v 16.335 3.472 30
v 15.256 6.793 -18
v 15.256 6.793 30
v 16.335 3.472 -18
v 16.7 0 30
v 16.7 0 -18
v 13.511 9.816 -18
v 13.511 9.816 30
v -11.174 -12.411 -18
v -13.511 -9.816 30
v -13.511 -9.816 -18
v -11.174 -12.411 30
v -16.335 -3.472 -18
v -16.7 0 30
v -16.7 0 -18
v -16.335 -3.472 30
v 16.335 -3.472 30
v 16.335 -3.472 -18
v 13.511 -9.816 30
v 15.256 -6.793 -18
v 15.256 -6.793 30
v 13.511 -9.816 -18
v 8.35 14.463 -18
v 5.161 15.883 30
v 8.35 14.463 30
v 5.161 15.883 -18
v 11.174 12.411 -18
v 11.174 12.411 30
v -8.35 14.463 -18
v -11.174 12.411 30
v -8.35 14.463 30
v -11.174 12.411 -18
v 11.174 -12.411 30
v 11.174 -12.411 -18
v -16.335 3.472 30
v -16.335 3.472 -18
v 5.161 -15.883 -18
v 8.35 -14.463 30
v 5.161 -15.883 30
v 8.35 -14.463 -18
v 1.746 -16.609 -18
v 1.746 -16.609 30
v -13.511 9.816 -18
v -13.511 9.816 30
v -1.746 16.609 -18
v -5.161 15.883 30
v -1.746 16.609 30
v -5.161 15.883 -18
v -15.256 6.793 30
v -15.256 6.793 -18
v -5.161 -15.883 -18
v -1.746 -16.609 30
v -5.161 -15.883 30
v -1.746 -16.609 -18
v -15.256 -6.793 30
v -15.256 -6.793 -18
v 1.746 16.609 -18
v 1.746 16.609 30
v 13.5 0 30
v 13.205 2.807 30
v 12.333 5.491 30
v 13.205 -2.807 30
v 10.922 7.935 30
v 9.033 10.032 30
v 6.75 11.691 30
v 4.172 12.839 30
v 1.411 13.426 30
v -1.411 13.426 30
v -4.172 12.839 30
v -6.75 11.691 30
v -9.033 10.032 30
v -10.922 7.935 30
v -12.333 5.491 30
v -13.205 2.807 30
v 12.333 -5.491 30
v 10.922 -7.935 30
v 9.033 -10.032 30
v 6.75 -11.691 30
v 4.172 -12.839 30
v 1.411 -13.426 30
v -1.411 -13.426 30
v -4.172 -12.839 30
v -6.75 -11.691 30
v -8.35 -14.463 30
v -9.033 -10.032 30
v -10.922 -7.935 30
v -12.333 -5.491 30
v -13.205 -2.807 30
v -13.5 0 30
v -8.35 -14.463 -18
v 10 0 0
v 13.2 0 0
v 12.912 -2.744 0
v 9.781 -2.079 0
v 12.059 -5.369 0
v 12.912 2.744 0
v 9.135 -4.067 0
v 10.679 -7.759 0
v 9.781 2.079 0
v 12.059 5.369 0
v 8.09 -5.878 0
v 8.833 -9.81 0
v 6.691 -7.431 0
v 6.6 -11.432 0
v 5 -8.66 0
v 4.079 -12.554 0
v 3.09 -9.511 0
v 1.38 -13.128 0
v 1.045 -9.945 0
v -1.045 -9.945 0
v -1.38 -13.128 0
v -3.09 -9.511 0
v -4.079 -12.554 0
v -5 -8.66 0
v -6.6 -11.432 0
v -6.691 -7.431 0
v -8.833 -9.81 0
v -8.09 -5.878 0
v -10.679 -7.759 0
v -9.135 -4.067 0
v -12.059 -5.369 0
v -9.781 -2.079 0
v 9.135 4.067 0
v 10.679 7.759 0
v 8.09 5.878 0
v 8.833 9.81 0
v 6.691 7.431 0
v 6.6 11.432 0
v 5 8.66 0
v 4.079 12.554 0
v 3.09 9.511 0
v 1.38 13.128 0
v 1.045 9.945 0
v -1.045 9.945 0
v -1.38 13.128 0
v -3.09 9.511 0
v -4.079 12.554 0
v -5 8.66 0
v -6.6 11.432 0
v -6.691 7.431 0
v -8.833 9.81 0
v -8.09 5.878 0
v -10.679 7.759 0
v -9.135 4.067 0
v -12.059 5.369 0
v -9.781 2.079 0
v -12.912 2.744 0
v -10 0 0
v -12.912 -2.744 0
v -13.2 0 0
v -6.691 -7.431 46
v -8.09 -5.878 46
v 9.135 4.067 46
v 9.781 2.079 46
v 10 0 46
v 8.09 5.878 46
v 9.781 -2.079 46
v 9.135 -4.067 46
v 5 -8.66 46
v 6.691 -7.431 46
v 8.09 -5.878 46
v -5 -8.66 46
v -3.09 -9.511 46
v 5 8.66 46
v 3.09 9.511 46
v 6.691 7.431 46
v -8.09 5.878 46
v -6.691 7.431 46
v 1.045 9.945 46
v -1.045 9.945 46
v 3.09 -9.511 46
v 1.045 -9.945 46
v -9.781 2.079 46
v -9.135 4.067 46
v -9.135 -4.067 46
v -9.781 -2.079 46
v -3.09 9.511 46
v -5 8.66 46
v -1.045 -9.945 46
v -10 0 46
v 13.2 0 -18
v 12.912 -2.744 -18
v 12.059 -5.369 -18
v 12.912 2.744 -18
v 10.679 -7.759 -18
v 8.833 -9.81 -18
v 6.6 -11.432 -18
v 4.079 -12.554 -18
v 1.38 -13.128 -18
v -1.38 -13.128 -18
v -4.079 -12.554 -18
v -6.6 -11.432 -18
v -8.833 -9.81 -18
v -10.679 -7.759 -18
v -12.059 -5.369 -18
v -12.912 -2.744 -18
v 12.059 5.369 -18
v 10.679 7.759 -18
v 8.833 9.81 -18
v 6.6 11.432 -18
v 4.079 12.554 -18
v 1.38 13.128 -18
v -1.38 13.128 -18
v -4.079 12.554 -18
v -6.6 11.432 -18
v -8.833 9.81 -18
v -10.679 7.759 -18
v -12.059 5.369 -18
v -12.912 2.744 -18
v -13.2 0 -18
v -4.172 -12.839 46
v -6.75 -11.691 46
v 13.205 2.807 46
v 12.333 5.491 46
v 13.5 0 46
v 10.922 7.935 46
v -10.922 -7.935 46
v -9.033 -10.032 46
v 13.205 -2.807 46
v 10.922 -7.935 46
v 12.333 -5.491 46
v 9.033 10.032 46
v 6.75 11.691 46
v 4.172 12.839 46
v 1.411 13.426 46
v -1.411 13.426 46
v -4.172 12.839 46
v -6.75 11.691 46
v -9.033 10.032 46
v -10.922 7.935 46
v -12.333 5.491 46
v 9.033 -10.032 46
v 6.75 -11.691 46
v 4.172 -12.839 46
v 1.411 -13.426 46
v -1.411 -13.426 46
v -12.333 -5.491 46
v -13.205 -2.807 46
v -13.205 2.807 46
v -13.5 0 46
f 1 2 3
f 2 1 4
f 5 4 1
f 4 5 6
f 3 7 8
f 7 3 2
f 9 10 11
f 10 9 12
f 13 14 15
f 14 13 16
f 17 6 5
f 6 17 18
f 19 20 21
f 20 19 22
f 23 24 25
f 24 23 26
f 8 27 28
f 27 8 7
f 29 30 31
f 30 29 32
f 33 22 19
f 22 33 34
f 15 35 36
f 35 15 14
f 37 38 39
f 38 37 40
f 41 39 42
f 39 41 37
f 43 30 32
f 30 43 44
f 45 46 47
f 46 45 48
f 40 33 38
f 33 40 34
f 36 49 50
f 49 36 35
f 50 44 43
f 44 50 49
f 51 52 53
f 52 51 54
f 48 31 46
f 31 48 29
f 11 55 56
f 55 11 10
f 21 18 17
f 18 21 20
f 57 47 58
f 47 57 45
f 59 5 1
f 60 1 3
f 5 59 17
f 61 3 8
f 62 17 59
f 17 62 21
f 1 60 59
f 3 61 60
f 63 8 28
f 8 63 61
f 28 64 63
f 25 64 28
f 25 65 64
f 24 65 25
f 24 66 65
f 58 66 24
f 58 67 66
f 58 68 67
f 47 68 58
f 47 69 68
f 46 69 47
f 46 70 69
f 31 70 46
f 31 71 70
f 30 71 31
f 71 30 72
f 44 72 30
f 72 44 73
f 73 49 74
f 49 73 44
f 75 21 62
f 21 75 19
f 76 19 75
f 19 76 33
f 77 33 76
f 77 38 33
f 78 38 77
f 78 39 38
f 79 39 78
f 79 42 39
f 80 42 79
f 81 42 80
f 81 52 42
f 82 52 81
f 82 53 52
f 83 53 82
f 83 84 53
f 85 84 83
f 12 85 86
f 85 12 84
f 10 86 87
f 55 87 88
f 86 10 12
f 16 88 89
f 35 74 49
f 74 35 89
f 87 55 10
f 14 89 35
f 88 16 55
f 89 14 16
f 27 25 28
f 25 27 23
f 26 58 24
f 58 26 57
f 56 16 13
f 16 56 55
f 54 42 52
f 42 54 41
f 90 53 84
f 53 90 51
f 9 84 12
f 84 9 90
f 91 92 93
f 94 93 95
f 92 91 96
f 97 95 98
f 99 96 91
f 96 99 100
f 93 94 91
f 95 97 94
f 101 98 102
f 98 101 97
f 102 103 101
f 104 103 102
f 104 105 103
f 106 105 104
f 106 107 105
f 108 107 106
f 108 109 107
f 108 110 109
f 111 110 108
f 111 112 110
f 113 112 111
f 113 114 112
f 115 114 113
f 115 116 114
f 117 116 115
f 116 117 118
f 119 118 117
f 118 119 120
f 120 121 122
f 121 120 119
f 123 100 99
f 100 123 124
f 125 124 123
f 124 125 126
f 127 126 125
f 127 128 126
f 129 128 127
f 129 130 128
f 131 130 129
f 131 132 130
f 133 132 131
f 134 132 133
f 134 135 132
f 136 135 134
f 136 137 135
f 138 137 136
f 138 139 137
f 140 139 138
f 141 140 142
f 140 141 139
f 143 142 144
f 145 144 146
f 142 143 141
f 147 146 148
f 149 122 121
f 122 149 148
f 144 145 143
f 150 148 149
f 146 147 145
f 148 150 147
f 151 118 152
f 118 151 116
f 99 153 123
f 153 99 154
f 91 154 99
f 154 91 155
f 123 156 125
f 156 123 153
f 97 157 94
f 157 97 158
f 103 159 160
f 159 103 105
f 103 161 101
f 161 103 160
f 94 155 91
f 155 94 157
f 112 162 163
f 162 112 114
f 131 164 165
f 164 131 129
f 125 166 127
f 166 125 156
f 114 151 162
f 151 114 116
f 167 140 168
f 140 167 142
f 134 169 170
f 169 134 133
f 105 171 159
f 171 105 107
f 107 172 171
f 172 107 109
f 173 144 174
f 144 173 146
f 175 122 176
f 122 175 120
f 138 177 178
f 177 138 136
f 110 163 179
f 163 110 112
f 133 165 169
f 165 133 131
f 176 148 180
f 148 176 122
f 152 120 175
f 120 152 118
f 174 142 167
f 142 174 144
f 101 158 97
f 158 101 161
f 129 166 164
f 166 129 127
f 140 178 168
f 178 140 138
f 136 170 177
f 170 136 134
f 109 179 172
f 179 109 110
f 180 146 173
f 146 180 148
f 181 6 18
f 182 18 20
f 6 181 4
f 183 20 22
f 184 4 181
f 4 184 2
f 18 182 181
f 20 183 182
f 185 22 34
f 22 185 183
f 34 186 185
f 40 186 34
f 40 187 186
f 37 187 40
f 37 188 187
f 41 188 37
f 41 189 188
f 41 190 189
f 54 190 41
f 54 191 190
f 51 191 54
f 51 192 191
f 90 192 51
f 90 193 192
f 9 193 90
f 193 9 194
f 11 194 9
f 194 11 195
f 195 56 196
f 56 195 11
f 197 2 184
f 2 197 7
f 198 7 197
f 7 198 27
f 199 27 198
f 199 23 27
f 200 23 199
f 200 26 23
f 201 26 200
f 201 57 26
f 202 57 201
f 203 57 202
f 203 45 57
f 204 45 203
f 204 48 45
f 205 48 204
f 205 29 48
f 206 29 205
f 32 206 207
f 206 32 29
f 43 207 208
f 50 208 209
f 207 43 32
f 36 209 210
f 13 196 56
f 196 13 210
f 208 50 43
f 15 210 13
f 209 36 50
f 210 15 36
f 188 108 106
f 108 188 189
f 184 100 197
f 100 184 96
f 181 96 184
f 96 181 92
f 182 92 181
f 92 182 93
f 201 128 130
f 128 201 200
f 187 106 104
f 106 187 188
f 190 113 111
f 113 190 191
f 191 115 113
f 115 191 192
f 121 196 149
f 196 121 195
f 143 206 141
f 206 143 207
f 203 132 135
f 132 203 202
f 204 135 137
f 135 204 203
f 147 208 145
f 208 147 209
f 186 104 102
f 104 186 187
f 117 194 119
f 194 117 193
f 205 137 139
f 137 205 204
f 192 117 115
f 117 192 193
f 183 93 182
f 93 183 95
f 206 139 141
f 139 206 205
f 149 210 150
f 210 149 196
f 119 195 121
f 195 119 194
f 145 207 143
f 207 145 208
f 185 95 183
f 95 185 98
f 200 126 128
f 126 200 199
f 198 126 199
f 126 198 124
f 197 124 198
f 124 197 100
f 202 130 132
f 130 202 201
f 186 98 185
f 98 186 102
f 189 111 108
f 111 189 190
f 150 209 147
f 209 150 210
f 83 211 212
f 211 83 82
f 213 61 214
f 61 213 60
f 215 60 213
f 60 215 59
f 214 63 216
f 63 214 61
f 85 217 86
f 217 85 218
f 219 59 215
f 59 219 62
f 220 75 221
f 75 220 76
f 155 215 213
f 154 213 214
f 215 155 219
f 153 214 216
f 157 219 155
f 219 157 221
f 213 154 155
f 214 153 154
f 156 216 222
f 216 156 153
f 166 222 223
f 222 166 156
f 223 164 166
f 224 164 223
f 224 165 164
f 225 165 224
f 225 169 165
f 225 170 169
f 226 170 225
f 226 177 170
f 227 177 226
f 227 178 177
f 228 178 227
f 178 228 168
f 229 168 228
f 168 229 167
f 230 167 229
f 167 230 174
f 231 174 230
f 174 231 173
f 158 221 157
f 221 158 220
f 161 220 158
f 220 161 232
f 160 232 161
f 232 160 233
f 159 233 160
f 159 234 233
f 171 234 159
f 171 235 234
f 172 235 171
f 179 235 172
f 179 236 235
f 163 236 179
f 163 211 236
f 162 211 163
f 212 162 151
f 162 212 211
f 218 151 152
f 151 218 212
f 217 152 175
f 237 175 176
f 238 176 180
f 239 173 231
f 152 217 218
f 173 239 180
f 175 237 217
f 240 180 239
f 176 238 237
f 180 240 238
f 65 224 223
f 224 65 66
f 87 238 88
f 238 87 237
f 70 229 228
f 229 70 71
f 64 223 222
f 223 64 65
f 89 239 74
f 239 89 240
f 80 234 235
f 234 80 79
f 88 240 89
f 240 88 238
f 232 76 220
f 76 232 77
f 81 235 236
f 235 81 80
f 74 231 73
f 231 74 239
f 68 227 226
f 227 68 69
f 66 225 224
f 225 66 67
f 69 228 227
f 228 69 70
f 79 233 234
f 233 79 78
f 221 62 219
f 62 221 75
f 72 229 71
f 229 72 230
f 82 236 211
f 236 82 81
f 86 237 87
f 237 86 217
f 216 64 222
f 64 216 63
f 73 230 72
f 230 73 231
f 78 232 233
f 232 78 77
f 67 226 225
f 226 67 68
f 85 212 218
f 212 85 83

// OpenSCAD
midsection_len = 30;
tenon_len = 16;
tenon_diameter = 13.5;
bottom_inside = tenon_diameter - 0.3;
wall_thickness = 3.5;
bottom_outside = bottom_inside + wall_thickness;
top_outside = tenon_diameter;
top_inside = tenon_diameter - wall_thickness;
bottom_len = tenon_len + 2;

// Mid-section
difference(){
  cylinder(
      midsection_len,
      bottom_outside,
      bottom_outside
  );
  cylinder(
    midsection_len,
    top_inside,
    top_inside
  );
};

// Bottom section
translate([0, 0, -1 * bottom_len]) {
  difference(){
    cylinder(
      bottom_len,
      bottom_outside,
      bottom_outside
    );
    cylinder(
      bottom_len,
      bottom_inside,
      bottom_inside
    );
  };
};

// Top section
translate([0, 0, midsection_len]) {
  difference(){
    cylinder(
      tenon_len,
      top_outside,
      top_outside
    );
    cylinder(
      tenon_len,
      top_inside,
      top_inside
    );
  };
};
